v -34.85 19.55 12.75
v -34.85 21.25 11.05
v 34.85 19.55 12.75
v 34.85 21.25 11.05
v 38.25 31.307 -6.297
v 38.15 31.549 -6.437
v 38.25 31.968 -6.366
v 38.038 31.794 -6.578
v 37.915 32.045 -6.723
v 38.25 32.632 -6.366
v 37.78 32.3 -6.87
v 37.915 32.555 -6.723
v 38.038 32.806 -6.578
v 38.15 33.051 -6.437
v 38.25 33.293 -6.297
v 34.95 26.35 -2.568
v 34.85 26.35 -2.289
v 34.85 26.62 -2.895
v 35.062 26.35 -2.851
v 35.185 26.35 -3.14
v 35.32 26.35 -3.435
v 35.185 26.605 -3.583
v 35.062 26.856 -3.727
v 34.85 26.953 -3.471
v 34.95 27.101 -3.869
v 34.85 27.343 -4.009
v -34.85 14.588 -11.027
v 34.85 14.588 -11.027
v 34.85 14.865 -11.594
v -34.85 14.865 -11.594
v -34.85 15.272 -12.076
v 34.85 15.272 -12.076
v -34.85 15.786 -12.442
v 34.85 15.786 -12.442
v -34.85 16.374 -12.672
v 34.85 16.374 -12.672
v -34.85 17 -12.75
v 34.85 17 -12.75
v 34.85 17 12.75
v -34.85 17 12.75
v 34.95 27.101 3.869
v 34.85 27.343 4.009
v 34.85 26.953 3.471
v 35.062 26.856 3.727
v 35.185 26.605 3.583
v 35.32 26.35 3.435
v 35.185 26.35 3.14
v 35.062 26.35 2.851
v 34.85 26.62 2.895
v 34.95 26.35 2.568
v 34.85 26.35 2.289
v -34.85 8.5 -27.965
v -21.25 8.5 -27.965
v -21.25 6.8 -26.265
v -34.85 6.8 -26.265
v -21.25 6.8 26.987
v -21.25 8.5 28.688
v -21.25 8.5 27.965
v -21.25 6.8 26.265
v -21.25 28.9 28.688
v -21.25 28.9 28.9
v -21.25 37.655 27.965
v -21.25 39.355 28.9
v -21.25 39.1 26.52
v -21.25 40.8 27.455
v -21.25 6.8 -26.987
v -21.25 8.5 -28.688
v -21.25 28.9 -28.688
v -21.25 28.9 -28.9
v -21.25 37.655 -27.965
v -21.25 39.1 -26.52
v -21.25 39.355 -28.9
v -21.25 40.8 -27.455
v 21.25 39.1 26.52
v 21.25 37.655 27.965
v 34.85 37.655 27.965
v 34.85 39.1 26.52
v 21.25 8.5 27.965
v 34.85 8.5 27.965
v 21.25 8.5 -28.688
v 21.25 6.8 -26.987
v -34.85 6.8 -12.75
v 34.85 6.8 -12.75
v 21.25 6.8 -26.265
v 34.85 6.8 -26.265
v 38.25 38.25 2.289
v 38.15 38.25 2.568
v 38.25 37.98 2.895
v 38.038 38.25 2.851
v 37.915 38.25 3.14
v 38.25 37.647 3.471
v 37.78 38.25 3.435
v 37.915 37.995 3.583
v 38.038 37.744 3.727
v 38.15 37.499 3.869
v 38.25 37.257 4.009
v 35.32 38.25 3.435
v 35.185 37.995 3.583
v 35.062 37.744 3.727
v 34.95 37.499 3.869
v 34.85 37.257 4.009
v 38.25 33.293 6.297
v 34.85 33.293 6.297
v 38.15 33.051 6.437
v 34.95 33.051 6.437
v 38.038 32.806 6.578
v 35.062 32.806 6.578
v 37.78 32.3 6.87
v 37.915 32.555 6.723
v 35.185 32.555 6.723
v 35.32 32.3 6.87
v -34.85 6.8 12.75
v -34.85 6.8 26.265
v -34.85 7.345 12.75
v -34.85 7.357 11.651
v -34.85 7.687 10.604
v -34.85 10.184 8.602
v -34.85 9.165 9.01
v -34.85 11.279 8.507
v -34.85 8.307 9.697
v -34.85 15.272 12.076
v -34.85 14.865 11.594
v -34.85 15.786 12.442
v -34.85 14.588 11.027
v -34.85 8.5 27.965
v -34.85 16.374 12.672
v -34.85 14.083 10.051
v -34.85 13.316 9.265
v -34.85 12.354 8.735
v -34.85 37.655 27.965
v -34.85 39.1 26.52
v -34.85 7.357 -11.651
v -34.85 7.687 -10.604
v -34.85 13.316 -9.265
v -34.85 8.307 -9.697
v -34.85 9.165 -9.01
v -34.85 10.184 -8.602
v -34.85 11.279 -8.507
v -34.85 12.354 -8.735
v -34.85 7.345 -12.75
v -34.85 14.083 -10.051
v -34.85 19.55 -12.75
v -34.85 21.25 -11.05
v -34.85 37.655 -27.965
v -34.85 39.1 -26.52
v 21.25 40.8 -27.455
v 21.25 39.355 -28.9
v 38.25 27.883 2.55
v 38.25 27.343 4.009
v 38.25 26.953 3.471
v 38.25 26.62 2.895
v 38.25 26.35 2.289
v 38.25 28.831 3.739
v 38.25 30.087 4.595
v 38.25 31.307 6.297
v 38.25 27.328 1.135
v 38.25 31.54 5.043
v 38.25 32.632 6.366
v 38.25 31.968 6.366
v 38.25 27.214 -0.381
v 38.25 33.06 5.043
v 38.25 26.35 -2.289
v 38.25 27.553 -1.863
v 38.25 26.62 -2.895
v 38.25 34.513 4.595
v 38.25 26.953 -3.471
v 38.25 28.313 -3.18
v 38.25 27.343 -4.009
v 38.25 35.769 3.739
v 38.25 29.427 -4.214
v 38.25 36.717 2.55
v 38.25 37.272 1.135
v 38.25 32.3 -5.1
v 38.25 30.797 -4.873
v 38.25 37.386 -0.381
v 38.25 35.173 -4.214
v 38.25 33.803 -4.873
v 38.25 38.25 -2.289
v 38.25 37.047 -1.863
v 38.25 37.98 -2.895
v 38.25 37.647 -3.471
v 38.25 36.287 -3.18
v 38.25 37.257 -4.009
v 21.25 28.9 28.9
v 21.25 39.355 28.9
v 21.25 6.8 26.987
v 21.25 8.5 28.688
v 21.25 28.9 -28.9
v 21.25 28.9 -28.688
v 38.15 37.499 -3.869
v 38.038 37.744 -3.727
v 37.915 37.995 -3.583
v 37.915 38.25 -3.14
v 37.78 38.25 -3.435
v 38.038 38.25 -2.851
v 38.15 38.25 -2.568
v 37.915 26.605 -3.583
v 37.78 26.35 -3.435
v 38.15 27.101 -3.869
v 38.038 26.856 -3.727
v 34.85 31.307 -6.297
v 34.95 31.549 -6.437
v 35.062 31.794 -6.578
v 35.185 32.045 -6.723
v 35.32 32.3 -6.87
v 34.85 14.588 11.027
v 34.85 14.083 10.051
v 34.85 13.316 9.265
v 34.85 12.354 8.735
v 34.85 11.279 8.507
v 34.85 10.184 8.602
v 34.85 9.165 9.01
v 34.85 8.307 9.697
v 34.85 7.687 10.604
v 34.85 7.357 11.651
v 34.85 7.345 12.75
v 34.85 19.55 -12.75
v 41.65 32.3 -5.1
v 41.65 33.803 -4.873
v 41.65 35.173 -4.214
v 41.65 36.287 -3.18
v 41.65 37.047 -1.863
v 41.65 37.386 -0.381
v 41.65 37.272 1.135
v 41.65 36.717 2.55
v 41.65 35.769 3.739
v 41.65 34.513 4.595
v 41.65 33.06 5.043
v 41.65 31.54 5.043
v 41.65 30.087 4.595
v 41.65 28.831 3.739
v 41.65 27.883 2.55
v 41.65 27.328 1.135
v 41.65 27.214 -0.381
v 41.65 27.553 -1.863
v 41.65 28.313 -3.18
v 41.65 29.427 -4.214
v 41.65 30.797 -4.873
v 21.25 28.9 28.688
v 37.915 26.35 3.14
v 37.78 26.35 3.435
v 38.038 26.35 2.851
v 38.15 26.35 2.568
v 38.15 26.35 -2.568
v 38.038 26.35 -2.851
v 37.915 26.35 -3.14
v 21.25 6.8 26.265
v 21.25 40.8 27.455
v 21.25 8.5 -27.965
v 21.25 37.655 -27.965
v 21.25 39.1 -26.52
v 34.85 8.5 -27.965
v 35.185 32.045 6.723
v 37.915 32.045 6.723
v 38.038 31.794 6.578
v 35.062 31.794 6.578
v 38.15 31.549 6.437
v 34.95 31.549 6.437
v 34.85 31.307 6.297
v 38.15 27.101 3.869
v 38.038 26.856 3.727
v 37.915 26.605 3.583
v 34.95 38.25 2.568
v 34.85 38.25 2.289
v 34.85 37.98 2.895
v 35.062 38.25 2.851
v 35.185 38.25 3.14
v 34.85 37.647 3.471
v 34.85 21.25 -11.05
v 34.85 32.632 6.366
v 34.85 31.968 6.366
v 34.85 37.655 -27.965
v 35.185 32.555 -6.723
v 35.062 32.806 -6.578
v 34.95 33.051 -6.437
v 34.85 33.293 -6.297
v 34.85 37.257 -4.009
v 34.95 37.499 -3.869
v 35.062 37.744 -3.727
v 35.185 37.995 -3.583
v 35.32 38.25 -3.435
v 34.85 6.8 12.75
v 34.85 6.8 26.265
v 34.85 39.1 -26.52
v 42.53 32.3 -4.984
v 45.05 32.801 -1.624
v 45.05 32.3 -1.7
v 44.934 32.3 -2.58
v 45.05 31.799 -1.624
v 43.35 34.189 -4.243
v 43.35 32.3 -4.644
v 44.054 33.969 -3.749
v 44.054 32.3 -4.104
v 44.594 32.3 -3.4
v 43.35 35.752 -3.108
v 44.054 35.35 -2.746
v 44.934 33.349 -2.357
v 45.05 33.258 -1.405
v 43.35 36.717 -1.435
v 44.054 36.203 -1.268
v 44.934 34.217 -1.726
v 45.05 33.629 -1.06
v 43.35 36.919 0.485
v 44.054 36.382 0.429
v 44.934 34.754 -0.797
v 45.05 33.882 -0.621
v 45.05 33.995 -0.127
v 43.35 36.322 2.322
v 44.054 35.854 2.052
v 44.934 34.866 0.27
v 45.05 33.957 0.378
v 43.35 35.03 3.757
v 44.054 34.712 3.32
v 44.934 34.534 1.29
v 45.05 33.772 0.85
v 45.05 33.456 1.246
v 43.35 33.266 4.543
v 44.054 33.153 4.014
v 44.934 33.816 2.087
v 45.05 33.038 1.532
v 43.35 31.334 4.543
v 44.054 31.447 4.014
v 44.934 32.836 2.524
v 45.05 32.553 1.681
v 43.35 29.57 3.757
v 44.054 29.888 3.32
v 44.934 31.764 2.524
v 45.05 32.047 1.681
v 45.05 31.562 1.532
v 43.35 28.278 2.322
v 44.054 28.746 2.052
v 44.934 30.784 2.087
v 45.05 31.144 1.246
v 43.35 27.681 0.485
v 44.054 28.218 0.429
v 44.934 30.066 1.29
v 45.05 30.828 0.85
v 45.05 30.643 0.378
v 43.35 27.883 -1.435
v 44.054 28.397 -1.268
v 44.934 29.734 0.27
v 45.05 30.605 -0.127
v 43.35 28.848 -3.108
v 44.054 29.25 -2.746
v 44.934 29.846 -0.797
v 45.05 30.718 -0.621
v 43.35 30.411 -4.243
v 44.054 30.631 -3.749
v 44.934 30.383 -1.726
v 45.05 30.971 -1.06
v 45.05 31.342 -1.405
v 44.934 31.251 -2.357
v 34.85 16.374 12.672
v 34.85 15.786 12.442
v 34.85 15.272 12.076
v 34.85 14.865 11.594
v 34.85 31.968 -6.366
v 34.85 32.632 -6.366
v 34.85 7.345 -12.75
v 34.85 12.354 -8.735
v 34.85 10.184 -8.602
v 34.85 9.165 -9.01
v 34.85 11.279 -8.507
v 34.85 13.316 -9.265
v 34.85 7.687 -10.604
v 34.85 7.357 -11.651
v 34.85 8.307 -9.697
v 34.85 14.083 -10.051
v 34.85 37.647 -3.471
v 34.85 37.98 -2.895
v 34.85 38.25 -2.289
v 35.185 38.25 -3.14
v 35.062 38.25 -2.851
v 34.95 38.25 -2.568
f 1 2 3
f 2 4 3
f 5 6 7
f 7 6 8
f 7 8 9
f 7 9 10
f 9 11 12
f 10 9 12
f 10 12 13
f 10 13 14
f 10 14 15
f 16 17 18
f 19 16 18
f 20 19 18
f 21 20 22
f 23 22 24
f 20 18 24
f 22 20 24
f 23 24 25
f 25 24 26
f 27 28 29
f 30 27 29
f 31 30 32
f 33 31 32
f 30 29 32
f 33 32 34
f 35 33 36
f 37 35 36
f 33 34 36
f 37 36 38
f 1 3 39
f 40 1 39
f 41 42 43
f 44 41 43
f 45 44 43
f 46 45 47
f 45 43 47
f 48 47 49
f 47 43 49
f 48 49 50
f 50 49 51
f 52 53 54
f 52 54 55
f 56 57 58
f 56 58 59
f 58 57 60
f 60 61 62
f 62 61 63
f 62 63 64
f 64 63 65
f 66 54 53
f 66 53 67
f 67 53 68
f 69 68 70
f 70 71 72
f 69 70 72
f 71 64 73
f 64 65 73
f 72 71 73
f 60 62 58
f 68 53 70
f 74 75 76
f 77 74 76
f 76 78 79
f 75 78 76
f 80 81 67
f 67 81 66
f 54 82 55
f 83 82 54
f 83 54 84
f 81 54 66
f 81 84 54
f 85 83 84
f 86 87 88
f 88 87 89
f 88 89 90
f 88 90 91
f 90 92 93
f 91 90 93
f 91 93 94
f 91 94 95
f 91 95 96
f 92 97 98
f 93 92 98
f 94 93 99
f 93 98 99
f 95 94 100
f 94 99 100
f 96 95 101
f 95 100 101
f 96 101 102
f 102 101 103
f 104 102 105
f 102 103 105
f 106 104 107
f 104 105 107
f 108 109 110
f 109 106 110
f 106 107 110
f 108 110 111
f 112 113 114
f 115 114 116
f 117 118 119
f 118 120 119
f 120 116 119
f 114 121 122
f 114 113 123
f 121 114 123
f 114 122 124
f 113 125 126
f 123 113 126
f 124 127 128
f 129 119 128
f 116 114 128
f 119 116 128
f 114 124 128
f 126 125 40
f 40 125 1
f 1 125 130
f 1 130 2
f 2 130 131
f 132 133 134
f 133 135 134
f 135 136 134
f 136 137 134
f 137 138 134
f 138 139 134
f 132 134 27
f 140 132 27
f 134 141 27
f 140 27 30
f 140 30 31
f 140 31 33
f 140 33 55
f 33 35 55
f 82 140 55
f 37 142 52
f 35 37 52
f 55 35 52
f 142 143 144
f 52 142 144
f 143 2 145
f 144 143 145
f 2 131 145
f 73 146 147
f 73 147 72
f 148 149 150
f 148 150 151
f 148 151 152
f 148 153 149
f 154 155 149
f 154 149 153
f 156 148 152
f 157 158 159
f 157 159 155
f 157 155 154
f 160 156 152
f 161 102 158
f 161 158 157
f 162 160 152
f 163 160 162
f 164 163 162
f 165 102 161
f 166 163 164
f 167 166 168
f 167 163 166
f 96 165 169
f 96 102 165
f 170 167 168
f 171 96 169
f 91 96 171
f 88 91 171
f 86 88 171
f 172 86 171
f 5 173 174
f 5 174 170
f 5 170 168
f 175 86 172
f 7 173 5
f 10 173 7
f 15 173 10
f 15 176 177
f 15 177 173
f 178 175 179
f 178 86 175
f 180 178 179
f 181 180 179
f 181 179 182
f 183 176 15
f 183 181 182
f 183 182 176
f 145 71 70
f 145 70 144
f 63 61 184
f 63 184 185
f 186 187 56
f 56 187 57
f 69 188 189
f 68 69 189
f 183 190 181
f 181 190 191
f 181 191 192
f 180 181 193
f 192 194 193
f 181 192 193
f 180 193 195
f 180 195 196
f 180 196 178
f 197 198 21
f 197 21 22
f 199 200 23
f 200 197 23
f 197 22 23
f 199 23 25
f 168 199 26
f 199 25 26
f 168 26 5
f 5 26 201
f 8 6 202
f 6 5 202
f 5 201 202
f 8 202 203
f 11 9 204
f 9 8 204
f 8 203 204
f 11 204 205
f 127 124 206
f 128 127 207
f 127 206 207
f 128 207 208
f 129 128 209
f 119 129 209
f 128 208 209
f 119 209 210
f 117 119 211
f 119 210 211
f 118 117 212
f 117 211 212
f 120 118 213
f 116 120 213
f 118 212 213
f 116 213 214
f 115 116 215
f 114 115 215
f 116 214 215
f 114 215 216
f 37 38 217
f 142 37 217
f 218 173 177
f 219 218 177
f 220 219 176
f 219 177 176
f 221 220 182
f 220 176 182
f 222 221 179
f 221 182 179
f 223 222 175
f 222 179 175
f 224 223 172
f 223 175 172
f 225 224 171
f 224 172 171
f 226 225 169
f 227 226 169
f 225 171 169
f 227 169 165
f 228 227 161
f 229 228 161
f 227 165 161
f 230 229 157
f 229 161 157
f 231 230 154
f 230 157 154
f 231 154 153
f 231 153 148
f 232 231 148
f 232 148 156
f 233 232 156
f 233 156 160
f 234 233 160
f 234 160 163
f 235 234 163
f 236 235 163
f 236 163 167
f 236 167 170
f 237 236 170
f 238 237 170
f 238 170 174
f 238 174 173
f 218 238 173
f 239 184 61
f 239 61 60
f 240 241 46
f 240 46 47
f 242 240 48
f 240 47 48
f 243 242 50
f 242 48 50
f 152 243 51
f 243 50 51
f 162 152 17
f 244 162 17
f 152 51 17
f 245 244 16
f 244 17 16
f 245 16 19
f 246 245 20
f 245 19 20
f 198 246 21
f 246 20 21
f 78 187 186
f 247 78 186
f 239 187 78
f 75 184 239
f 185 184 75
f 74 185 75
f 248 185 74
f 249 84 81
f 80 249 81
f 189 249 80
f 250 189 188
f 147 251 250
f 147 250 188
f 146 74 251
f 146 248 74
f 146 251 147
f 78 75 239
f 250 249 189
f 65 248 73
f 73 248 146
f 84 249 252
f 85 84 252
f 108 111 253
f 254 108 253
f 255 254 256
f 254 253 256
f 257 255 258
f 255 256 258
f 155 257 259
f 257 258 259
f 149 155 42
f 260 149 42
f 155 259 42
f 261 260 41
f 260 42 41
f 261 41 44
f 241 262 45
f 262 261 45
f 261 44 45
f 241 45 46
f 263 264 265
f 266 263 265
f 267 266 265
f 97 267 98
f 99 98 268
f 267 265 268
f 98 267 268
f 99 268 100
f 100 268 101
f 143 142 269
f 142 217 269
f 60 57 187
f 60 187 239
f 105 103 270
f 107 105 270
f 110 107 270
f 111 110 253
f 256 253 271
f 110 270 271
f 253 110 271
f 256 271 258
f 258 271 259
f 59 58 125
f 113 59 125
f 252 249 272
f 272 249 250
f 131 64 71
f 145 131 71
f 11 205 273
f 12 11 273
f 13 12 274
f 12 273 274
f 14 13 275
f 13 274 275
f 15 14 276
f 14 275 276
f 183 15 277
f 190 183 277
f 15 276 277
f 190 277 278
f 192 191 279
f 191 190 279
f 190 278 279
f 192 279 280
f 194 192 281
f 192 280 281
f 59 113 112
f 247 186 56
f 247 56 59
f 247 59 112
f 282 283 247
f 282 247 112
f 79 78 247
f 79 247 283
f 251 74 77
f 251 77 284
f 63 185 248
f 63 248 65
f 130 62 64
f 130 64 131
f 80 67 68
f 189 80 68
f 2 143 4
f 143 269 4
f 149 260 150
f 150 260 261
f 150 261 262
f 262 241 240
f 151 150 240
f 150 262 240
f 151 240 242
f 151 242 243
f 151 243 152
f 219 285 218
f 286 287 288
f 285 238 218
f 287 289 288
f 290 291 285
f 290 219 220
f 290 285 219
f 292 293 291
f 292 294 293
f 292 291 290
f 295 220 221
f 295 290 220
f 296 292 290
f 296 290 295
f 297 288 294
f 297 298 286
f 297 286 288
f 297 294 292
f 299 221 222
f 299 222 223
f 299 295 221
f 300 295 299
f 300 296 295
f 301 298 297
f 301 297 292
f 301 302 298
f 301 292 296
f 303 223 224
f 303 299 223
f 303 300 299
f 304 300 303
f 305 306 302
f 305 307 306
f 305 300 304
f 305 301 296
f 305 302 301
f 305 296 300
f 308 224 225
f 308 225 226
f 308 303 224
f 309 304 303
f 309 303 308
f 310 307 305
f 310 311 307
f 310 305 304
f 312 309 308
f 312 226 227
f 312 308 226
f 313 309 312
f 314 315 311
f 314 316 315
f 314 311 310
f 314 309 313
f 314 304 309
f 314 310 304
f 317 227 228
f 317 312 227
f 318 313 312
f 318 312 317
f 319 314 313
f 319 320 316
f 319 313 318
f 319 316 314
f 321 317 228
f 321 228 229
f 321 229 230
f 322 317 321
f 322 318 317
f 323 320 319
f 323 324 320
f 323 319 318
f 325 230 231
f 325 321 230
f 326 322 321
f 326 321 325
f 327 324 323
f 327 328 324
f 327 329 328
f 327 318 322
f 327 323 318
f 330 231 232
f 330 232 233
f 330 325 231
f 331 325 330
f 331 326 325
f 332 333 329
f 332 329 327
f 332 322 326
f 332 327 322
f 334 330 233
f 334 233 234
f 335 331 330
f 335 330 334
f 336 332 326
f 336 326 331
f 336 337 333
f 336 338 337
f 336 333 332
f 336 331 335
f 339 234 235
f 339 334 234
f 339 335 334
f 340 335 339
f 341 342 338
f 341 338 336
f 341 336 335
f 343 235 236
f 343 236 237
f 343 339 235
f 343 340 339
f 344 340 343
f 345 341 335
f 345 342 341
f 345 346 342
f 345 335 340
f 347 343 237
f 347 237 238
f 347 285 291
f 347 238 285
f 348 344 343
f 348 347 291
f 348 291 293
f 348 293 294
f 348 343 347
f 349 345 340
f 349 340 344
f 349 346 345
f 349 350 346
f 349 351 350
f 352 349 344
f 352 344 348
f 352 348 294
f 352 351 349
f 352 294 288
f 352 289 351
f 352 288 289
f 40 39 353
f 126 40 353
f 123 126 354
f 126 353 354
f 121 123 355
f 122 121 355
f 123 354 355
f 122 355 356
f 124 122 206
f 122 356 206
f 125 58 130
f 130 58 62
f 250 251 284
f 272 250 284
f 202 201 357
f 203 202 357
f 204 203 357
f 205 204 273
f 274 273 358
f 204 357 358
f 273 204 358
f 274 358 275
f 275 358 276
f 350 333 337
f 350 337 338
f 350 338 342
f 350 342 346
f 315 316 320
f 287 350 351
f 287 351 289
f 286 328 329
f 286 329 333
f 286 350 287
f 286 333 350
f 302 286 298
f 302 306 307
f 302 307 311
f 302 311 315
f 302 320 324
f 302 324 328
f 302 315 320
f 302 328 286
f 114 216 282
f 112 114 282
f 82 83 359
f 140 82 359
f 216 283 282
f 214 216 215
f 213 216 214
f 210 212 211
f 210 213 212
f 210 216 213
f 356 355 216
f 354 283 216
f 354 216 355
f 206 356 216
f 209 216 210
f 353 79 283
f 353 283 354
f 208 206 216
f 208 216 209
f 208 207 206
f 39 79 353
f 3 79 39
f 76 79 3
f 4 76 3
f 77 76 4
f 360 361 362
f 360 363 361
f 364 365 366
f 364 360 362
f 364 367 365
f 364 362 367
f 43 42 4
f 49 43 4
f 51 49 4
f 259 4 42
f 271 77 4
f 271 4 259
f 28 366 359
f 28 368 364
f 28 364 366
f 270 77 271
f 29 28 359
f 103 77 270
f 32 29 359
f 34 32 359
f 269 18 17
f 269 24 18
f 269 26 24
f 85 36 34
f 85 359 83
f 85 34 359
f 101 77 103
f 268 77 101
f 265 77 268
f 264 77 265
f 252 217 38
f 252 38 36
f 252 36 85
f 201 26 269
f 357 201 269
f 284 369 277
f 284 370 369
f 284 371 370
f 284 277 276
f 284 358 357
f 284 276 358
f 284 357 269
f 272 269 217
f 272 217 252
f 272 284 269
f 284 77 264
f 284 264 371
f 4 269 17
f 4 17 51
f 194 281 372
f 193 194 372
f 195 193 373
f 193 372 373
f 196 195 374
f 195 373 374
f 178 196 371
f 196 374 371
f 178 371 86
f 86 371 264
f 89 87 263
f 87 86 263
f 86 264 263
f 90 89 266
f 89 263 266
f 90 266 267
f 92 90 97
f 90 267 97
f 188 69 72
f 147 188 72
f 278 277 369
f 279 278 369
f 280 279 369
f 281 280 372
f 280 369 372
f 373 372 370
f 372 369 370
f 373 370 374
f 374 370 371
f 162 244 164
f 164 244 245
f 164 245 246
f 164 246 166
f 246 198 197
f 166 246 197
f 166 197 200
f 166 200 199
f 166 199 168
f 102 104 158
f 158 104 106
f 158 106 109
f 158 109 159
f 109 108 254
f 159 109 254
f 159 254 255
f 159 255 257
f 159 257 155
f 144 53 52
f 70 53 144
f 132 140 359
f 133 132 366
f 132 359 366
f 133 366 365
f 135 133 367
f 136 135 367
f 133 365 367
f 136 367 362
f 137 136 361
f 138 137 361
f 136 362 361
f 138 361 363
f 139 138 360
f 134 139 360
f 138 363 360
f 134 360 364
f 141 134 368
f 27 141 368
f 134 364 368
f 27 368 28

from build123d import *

# Parameters (mm, degrees)
SKETCH1_W           = 34
SKETCH1_H           = 20
BOSS_EXTRUDE1_DEPTH = 20.5
SKETCH2_OUTSIDE_W   = 47.378
SKETCH2_OUTSIDE_H   = 33.378
SKETCH2_OUTSIDE_W_2 = 32.9
SKETCH2_OUTSIDE_H_2 = 19
CUT_EXTRUDE2_DEPTH  = 45.204072211
CUT_EXTRUDE5_DEPTH  = 20.5
SKETCH3_W           = 0.125
SKETCH3_H           = 13
CUT_EXTRUDE3_DEPTH  = 25
CHAMFER1_SIZE       = 0.85
CHAMFER2_SIZE       = 0.85
CHAMFER3_SIZE       = 1
CHAMFER4_SIZE       = 1
BOSS_EXTRUDE2_DEPTH = 2
SKETCH10_R          = 3
BOSS_EXTRUDE3_DEPTH = 6
FILLET1_R           = 2
SCALE_1_SCALE       = 1.7


with BuildPart() as part:
    # Sketch1 → Boss-Extrude1 (new, symmetric)
    with BuildSketch(Plane(origin=(0, 0, 0), x_dir=(0, 0, -1), z_dir=(1, 0, 0))):
        with Locations((0, 14)):
            Rectangle(SKETCH1_W, SKETCH1_H)
    extrude(amount=BOSS_EXTRUDE1_DEPTH, both=True)

    # Sketch2 outside → Cut-Extrude2 (cut, through all)
    with BuildSketch(Plane(origin=(12.5, 0, 0), x_dir=(0, 0, -1), z_dir=(1, 0, 0))):
        with Locations((0, 14)):
            Rectangle(SKETCH2_OUTSIDE_W, SKETCH2_OUTSIDE_H)
        with Locations((0, 13.5)):
            Rectangle(SKETCH2_OUTSIDE_W_2, SKETCH2_OUTSIDE_H_2, mode=Mode.SUBTRACT)
    cut_extrude2 = extrude(amount=CUT_EXTRUDE2_DEPTH, mode=Mode.SUBTRACT)

    # Mirror1: Cut-Extrude2 across plane
    add(cut_extrude2.mirror(Plane(origin=(0, 0, 0), x_dir=(0, 0, 1), z_dir=(1, 0, 0))), mode=Mode.SUBTRACT)

    # Sketch5 → Cut-Extrude5 (cut, symmetric)
    with BuildSketch(Plane(origin=(0, 0, 0), x_dir=(0, 0, -1), z_dir=(1, 0, 0))):
        with BuildLine():
            Line((-6.5, 12.5), (-7.5, 11.5))
            Line((-7.5, 11.5), (-7.5, 10))
            ThreePointArc((-7.5, 10), (-7.220600207, 9.128142709), (-6.486486487, 8.581081081))
            ThreePointArc((-6.486486487, 8.581081081), (-5.059724667, 5.990862007), (-7.5, 4.320550528))
            Line((-7.5, 4.320550528), (-7.5, 0.5))
            Line((-7.5, 0.5), (-7, 0))
            Line((-7, 0), (7, 0))
            Line((7, 0), (7.5, 0.5))
            Line((7.5, 0.5), (7.5, 4.320550528))
            ThreePointArc((7.5, 4.320550528), (5.059724667, 5.990862007), (6.486486487, 8.581081081))
            ThreePointArc((6.486486487, 8.581081081), (7.220600207, 9.128142709), (7.5, 10))
            Line((7.5, 10), (7.5, 11.5))
            Line((7.5, 11.5), (6.5, 12.5))
            Line((6.5, 12.5), (-6.5, 12.5))
        make_face()
    extrude(amount=CUT_EXTRUDE5_DEPTH, both=True, mode=Mode.SUBTRACT)

    # Sketch3 → Cut-Extrude3 (cut)
    with BuildSketch(Plane(origin=(12.5, 0, 0), x_dir=(0, 0, -1), z_dir=(1, 0, 0))):
        with Locations((-16.9375, 10.5)):
            Rectangle(SKETCH3_W, SKETCH3_H)
    cut_extrude3 = extrude(amount=-CUT_EXTRUDE3_DEPTH, mode=Mode.SUBTRACT)

    # Mirror2: Cut-Extrude3 across plane
    add(cut_extrude3.mirror(Plane.XY), mode=Mode.SUBTRACT)

    # Chamfer1
    chamfer1_edges = [part.edges().sort_by_distance(p)[0] for p in [
        (16.5, 23, -16.45),
        (16.5, 23, 16.45),
        (-16.5, 23, 16.45),
        (-16.5, 23, -16.45),
    ]]
    chamfer(chamfer1_edges, length=CHAMFER1_SIZE)

    # Chamfer2
    chamfer2_edges = [part.edges().sort_by_distance(p)[0] for p in [
        (0, 24, 17),
        (0, 24, -17),
    ]]
    chamfer(chamfer2_edges, length=CHAMFER2_SIZE)

    # Chamfer3
    chamfer3_edges = [part.edges().sort_by_distance(p)[0] for p in [
        (16.5, 4, 16.45),
        (16.5, 4, -16.45),
        (-16.5, 4, -16.45),
        (-16.5, 4, 16.45),
    ]]
    chamfer(chamfer3_edges, length=CHAMFER3_SIZE)

    # Chamfer4
    chamfer4_edges = [part.edges().sort_by_distance(p)[0] for p in [
        (0, 4, 16.875),
        (0, 4, -16.875),
    ]]
    chamfer(chamfer4_edges, length=CHAMFER4_SIZE)

    # Sketch7 → Boss-Extrude2 (add)
    with BuildSketch(Plane(origin=(20.5, 0, 0), x_dir=(0, 0, -1), z_dir=(1, 0, 0))):
        Polygon((-2.020725942, 15.5), (2.020725942, 15.5), (4.041451884, 19), (2.020725942, 22.5), (-2.020725942, 22.5), (-4.041451884, 19), align=None)
    extrude(amount=BOSS_EXTRUDE2_DEPTH)

    # Sketch9 → Cut-Revolve1 (revolve, cut)
    with BuildSketch(Plane.XY):
        Polygon((22.5, 22.75), (21.5, 23.803780125), (20.5, 22.75), (20.5, 24), (22.5, 24), align=None)
    revolve(axis=Axis((20.5, 19, 0), (1, 0, 0)), mode=Mode.SUBTRACT)

    # Sketch10 → Boss-Extrude3 (add)
    with BuildSketch(Plane(origin=(20.5, 0, 0), x_dir=(0, 0, -1), z_dir=(1, 0, 0))):
        with Locations((0, 19)):
            Circle(SKETCH10_R)
    extrude(amount=BOSS_EXTRUDE3_DEPTH)

    # Fillet1
    fillet1_edges = [part.edges().sort_by_distance(p)[0] for p in [
        (26.5, 19, 3),
    ]]
    fillet(fillet1_edges, radius=FILLET1_R)


with BuildPart() as part_1:
    # Scale 1: scaled about (0, 0, 0)
    add(part.part.scale(SCALE_1_SCALE))


solid = part_1.part
